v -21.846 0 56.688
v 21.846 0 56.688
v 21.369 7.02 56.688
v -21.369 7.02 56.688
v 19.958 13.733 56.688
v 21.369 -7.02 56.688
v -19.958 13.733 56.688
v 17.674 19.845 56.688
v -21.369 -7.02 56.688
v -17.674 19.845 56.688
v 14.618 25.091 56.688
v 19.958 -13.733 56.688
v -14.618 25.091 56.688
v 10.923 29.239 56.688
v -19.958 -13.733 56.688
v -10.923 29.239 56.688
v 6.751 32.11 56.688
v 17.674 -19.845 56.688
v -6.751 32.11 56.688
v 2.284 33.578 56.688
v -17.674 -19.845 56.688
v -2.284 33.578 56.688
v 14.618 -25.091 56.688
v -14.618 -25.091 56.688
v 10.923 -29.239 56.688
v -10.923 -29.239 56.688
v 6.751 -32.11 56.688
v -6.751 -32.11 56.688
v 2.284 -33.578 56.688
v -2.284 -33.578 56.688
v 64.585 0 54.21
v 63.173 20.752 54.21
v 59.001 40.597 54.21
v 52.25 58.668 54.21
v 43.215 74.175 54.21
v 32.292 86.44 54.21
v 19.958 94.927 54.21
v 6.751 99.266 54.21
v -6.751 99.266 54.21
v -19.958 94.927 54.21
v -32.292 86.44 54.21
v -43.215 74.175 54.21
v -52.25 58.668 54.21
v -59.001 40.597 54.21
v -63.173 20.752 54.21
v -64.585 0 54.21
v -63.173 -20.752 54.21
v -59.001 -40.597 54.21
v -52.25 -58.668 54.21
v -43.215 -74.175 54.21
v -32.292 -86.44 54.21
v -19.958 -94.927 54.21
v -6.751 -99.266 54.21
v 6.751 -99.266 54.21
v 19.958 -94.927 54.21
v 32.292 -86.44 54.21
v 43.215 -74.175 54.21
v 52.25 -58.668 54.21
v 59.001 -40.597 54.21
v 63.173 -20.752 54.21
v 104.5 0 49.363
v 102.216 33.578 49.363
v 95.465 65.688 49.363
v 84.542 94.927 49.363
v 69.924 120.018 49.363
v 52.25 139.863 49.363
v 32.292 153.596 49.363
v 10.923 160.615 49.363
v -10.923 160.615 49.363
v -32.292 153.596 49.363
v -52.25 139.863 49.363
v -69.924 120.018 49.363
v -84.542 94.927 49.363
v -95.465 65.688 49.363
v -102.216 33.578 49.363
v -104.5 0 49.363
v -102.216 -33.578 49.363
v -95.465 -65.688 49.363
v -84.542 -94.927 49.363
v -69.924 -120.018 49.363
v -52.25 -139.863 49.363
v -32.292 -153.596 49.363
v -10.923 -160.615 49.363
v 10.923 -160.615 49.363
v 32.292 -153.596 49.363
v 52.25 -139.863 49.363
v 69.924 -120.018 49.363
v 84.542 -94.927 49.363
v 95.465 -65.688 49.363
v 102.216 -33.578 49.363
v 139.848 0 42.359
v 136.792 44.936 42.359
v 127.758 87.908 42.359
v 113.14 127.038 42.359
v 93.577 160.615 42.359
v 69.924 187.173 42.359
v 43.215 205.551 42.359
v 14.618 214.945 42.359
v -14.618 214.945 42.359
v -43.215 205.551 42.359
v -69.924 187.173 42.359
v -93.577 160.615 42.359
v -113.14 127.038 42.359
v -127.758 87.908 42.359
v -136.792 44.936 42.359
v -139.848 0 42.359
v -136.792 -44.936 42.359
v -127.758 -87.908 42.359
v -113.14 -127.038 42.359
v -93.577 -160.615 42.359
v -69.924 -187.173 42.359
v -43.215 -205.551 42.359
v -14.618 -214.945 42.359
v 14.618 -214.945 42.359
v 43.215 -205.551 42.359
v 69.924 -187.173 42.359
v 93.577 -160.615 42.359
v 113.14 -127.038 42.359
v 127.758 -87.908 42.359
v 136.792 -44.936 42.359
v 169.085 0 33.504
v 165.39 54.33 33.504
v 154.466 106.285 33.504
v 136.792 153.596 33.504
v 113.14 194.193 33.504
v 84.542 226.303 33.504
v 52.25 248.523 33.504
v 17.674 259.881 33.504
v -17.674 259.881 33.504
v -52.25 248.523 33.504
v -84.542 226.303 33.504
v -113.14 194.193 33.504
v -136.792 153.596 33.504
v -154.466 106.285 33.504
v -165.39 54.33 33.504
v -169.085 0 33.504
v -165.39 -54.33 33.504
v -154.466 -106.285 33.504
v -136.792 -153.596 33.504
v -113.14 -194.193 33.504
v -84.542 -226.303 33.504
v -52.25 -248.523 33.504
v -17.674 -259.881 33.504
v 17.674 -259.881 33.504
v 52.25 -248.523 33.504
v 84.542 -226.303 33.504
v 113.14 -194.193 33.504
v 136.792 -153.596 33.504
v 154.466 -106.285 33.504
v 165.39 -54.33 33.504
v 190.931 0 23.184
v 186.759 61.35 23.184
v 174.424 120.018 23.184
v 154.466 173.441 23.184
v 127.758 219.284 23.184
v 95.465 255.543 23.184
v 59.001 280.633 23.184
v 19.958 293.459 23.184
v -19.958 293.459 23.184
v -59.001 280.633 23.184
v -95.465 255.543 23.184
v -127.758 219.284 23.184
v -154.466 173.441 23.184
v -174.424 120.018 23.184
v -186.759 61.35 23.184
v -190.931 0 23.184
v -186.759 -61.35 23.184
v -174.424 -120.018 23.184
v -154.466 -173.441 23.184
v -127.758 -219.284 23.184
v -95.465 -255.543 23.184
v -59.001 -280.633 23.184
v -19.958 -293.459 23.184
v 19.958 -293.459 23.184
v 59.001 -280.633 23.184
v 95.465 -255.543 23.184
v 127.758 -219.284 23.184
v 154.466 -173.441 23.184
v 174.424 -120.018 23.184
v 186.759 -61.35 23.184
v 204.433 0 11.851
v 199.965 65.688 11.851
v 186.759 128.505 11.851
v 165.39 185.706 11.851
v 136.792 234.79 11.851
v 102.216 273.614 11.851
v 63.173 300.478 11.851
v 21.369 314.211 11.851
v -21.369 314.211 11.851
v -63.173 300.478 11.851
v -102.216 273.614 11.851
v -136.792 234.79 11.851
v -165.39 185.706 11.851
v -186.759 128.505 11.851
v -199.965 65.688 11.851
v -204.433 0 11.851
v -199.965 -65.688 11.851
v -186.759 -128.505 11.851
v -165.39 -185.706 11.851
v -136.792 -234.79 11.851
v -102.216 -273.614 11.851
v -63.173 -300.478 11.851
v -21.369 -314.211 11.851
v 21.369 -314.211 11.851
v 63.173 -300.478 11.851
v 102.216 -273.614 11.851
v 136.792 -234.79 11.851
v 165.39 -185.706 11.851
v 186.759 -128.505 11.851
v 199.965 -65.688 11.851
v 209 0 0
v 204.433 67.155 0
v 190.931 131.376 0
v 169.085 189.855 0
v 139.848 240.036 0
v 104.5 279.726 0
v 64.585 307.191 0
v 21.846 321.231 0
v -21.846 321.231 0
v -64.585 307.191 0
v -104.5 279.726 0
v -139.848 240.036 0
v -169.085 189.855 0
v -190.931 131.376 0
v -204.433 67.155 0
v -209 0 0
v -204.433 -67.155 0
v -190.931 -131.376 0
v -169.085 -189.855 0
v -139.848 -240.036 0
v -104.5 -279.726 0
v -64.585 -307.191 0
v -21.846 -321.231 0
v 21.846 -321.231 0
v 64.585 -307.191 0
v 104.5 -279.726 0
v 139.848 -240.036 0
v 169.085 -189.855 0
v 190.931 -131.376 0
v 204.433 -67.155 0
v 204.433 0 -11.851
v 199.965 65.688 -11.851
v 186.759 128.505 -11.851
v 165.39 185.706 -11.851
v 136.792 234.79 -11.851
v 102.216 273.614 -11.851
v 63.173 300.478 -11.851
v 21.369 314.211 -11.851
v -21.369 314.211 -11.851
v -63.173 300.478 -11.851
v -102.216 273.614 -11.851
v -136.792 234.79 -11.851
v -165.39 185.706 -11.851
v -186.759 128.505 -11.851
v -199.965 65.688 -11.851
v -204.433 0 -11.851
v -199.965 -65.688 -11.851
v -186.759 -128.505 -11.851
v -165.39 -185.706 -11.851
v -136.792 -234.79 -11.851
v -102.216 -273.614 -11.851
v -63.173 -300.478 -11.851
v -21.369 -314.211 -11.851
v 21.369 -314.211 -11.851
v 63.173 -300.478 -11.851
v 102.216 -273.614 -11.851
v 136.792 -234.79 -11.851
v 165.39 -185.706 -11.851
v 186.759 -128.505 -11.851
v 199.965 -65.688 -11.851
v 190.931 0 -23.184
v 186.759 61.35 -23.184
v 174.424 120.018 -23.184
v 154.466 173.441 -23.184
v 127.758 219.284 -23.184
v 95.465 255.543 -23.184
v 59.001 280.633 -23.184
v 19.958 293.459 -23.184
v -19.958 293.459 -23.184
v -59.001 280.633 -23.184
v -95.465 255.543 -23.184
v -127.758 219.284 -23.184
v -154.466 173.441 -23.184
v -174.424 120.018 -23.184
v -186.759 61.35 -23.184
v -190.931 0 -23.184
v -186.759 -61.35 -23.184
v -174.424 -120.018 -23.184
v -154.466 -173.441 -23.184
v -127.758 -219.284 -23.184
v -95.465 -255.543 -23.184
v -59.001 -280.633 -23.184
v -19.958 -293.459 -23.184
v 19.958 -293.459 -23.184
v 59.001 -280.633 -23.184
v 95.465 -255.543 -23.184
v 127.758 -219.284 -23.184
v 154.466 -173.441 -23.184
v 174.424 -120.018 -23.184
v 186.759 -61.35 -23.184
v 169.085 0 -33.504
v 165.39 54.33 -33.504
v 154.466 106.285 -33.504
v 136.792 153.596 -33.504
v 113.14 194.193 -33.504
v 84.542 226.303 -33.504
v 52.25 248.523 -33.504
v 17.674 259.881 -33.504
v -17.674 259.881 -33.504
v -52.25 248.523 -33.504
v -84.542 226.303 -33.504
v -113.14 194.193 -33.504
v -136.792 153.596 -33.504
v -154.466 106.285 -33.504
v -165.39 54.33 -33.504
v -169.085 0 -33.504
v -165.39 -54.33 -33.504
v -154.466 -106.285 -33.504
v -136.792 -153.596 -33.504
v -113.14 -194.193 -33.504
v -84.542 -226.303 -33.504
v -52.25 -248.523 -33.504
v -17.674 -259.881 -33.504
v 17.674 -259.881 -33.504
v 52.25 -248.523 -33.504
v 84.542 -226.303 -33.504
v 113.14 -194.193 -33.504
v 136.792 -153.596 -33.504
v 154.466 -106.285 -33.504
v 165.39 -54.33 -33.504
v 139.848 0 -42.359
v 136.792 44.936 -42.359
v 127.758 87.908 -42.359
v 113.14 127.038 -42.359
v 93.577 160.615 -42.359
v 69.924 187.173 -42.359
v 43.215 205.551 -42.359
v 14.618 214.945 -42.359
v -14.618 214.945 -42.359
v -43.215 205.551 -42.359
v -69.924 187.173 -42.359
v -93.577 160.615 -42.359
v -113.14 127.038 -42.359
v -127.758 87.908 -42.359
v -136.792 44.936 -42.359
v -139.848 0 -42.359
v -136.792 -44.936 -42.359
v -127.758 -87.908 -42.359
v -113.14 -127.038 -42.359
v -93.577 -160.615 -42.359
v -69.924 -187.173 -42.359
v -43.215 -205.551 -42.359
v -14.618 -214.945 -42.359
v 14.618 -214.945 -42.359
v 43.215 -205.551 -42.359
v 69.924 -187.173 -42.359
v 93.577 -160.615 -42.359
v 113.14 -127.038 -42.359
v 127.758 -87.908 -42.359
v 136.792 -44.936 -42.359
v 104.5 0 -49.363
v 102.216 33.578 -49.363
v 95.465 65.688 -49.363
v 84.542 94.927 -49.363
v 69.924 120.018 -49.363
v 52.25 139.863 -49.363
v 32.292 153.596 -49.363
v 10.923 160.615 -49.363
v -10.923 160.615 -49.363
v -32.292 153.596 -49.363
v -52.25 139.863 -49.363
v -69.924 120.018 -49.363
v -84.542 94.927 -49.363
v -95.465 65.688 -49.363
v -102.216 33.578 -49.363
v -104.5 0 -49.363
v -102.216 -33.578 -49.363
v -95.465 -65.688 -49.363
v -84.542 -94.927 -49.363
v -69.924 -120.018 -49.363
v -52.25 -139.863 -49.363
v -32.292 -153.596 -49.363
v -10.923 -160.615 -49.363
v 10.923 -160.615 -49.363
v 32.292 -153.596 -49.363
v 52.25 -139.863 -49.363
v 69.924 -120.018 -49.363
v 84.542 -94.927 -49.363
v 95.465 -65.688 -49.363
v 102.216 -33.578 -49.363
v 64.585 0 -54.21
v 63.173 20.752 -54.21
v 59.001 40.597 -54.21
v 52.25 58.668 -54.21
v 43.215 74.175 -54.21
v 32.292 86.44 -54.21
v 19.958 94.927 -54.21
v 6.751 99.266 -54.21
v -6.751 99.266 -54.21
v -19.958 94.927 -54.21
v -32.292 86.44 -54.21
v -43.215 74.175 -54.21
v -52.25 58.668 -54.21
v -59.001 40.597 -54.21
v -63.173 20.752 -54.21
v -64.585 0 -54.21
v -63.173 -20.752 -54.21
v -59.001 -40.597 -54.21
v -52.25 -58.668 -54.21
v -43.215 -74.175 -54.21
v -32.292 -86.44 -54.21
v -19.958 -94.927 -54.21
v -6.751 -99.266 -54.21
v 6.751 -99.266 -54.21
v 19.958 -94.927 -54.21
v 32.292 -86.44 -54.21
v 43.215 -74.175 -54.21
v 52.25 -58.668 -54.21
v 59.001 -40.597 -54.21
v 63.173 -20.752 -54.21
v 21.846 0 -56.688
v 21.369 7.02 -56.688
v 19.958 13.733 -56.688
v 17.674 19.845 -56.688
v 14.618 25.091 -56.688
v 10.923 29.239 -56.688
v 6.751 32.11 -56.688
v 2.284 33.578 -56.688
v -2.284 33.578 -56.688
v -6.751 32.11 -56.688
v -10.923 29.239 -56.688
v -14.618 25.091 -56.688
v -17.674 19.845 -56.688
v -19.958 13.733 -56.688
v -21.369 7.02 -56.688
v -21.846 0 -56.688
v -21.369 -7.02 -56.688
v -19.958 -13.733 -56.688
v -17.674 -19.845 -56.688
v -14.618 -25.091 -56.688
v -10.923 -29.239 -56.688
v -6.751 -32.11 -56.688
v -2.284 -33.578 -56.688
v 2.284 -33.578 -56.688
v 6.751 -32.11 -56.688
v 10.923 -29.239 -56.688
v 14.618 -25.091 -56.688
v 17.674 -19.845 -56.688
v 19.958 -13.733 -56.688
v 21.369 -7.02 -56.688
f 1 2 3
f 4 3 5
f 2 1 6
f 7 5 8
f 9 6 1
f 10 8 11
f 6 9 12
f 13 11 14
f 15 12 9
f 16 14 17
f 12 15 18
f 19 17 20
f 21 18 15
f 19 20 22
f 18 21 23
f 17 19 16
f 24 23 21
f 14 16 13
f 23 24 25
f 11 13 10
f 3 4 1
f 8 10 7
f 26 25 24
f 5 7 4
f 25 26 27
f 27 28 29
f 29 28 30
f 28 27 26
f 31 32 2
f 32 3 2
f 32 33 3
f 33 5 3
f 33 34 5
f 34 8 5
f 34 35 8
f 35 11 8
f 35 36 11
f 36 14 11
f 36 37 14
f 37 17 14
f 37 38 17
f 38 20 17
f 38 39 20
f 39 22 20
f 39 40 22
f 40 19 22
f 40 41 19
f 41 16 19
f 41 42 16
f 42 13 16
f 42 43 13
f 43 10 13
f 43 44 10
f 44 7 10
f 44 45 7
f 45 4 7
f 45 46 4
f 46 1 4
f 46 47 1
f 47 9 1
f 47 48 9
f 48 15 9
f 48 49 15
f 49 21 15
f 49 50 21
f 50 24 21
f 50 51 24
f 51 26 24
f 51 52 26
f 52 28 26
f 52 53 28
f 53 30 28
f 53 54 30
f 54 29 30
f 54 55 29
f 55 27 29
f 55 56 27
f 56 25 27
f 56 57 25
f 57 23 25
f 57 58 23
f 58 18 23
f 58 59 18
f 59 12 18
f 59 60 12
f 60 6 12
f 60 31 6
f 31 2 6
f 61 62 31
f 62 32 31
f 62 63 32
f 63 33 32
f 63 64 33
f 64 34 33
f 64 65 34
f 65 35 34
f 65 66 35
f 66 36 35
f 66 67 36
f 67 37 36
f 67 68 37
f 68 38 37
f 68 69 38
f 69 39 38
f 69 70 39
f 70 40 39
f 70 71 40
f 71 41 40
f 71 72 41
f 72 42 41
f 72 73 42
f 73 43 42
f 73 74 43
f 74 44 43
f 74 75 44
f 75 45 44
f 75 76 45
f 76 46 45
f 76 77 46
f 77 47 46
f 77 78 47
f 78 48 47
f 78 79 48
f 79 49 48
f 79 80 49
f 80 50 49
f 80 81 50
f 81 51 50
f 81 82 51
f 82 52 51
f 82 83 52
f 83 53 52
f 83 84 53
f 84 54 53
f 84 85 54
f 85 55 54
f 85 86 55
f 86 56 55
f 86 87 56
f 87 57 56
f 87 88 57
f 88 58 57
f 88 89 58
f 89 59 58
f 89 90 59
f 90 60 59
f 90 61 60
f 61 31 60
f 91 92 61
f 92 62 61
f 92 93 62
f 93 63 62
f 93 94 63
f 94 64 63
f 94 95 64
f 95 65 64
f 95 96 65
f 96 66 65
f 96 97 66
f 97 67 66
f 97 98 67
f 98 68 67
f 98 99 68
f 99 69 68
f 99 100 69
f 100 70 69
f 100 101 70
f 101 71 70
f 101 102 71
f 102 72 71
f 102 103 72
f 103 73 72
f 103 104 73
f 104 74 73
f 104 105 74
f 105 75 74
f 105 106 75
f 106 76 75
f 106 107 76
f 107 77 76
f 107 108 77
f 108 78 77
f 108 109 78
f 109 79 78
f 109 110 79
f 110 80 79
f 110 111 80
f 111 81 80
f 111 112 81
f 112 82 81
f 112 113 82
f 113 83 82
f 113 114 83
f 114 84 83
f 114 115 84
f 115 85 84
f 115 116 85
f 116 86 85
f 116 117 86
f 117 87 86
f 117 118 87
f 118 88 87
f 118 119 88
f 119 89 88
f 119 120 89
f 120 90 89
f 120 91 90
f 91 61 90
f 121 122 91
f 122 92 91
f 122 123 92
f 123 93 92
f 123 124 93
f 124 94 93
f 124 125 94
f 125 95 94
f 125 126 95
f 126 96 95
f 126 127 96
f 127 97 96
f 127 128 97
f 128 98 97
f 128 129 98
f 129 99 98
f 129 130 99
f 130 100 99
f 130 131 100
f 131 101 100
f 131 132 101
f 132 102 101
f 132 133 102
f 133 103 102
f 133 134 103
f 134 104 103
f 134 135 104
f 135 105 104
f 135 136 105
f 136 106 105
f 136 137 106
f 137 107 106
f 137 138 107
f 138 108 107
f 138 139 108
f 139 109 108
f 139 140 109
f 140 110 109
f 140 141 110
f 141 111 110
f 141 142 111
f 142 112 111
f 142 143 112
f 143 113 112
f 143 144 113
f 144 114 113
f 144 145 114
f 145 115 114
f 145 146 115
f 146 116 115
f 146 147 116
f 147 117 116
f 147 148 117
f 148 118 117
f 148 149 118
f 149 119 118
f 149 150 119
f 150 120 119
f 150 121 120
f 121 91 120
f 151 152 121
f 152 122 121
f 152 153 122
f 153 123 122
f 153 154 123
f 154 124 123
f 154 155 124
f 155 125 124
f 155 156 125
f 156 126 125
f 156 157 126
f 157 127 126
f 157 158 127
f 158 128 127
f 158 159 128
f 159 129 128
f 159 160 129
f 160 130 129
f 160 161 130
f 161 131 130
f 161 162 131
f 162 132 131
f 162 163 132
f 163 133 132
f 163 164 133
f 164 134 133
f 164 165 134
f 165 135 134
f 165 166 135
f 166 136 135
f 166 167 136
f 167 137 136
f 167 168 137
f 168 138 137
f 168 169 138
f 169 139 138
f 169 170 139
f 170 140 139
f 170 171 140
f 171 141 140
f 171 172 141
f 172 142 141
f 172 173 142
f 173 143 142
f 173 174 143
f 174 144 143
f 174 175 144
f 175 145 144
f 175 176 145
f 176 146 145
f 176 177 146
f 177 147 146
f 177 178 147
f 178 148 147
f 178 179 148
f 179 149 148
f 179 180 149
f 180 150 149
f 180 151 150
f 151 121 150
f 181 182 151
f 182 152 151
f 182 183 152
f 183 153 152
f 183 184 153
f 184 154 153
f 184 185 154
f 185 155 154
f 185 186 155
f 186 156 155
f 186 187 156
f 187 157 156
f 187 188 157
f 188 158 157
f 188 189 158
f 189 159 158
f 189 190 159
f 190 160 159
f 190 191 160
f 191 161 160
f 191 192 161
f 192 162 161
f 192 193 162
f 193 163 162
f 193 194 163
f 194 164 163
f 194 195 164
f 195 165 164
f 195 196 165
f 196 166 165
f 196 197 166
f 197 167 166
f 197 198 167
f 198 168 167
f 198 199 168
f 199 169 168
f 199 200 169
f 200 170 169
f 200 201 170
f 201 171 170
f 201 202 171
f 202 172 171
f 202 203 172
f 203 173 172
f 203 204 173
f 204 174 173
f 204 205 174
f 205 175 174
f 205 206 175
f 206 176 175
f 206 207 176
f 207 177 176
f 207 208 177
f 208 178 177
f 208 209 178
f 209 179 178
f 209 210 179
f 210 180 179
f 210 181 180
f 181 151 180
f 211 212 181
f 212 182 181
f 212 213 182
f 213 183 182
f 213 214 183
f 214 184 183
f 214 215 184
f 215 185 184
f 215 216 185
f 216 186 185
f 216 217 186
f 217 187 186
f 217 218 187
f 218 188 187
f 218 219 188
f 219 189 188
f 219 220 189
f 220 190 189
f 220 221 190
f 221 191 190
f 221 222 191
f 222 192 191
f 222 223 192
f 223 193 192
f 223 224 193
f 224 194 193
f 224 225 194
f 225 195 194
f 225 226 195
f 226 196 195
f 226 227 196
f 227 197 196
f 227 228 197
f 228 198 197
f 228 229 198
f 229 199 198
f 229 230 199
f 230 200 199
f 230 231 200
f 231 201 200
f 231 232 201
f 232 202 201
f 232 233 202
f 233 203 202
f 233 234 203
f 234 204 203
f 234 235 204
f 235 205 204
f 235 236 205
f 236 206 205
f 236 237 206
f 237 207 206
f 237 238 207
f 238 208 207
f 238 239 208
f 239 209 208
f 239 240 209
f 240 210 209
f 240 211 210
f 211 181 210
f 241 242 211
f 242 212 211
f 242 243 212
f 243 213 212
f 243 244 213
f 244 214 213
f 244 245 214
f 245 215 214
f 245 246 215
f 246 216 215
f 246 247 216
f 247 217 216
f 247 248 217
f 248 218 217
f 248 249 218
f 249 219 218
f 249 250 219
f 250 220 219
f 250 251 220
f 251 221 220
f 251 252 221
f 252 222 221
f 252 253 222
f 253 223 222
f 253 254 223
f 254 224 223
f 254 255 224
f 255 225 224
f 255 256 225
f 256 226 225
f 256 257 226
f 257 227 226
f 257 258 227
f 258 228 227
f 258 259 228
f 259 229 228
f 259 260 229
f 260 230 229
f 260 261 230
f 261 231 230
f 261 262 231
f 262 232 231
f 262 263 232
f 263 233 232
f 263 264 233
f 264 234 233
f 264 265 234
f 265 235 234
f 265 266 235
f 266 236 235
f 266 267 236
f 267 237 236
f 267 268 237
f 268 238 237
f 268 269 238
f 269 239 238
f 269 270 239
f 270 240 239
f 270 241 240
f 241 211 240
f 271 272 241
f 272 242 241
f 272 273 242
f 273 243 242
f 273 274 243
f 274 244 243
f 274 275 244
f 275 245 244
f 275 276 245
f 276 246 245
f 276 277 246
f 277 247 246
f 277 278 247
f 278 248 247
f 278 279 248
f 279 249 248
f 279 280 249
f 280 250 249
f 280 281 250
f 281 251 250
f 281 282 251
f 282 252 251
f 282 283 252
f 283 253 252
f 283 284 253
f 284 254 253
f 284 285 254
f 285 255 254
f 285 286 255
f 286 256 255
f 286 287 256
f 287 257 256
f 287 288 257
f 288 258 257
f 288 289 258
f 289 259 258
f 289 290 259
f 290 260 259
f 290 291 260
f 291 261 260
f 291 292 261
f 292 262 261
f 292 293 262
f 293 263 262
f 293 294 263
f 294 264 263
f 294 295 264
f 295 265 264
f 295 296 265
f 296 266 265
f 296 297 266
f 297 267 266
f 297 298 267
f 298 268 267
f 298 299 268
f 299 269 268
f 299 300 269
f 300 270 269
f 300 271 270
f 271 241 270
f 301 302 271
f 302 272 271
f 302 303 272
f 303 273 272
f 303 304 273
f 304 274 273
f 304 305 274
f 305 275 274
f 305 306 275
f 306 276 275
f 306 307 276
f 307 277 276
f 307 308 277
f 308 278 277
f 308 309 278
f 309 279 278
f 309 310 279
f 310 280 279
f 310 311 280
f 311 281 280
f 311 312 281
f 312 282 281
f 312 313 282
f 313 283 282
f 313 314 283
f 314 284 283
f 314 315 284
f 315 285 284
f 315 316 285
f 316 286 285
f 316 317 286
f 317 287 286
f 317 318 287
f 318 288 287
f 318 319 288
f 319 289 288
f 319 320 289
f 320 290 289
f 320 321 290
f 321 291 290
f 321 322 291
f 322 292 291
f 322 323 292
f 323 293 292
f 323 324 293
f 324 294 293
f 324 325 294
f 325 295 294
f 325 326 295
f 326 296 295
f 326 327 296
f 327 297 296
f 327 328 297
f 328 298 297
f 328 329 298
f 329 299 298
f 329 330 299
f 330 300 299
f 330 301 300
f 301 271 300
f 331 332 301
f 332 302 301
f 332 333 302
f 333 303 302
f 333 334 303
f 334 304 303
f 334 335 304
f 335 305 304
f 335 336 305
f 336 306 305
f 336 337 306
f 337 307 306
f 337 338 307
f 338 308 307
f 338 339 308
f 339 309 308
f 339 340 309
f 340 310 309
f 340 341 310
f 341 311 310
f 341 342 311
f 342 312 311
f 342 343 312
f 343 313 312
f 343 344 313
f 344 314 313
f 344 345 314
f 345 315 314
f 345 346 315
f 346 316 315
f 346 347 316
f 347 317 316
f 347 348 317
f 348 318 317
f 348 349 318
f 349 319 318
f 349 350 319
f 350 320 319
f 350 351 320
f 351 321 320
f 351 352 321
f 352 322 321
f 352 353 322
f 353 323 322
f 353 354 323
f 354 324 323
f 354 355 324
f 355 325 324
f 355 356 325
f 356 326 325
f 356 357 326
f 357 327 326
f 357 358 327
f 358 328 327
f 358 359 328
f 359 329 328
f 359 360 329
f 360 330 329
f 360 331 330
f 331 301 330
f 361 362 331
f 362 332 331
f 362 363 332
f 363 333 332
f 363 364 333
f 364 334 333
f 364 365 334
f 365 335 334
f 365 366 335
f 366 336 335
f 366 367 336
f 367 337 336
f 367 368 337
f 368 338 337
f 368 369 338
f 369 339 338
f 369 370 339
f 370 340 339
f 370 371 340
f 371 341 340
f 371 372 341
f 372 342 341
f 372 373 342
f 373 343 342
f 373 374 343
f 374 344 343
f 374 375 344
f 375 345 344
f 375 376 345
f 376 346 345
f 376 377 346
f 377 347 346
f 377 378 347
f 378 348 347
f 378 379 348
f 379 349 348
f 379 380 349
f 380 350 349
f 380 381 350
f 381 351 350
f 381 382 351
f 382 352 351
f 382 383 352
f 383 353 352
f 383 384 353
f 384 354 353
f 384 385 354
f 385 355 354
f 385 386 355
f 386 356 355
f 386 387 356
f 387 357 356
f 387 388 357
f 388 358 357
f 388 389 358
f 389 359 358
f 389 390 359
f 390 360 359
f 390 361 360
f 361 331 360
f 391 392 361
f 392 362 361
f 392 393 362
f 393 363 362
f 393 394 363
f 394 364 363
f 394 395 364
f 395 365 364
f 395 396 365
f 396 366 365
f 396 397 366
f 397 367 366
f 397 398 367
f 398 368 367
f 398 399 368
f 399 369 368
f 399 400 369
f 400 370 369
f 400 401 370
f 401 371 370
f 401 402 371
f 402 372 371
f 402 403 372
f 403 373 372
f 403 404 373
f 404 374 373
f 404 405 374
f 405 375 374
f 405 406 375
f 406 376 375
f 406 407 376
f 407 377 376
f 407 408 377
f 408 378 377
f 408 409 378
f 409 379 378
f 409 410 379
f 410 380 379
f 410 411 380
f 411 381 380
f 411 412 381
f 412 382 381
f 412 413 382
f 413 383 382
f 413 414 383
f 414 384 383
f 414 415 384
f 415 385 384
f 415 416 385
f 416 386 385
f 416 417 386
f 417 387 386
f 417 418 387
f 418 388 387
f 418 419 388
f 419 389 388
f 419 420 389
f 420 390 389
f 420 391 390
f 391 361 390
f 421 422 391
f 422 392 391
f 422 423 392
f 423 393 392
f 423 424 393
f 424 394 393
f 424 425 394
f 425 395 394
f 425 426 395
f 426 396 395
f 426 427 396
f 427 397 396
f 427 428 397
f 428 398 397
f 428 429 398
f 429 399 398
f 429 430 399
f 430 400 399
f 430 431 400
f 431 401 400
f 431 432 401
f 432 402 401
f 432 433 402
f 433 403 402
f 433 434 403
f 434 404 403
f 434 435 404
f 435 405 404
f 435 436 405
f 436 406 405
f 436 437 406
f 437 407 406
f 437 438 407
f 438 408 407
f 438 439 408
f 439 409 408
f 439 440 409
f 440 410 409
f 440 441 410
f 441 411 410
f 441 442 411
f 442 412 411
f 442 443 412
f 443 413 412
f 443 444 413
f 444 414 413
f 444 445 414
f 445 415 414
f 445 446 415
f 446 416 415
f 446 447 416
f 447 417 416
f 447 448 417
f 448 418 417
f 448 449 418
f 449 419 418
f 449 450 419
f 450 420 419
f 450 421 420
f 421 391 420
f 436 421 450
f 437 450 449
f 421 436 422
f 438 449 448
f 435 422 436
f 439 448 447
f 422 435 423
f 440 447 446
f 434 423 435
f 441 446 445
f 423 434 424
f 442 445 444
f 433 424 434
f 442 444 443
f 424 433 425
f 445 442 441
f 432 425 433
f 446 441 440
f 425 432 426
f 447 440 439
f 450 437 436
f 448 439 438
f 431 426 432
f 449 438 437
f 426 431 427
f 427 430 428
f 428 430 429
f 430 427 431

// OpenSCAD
// Generated by SolidPython 1.0.1 on 2020-07-29 00:46:50


scale(v = [11, 17, 3]) {
	sphere(r = 19);
}
/***********************************************
*********      SolidPython code:      **********
************************************************
 
# import packages: SolidPython
from solid import *
from solid.utils import *
from itertools import chain, combinations, permutations


class Resize:

    def __init__(self, scad_file):
        self.scad_file = scad_file
        #self.scad_file = import_scad(scad_file)
        # cone/cylinder param:
        self.r1 = 0
        self.r2 = 0
        self.h = 0
        # rectangular prism param:
        self.w = 0
        self.l = 0
        # ellipse param:
        self.r = 0

    # import OpenScad code (file name corresponds to shape)


    # classify shape + parameters
    def assign(self, param1, param2, param3):
        if self.scad_file == 'cone.scad':
            self.r1 = param1
            self.r2 = param2
            self.h = param3
        elif self.scad_file == 'cylinder.scad':
            self.r1 = param1
            self.r2 = param2
            self.h = param3
        elif self.scad_file == 'rectangularPrism.scad':
            self.h = param1
            self.l = param2
            self.w = param3
        else:
            self.r = param1
            self.h = param2

    # resize parameters
    def iterate(self):
        x = range(3, 20, 2)
        i = 1
        if self.scad_file == 'cone.scad':
            tempList = list(permutations(x, 2))
            for temp in tempList:
                param1 = temp[0]
                param2 = temp[1]
                filepath = 'produced_scad_files/' + 'cone' + str(param1) + '_' + str(param2) + '_' + '.scad'
                scad_render_to_file(cylinder(h=param1, r1=param2, r2=0), filepath)

        elif self.scad_file == 'cylinder.scad':
            tempList = list(permutations(x, 3))
            for temp in tempList:
                param1 = temp[0]
                param2 = temp[1]
                filepath = 'produced_scad_files/' + 'cylinder' + str(param1) + '_' + str(param2) + '_' + '.scad'
                scad_render_to_file(cylinder(h=param1, r1=param2, r2=param2), filepath)

        elif self.scad_file == 'rectangularPrism.scad':
            tempList = list(permutations(x, 3))
            for temp in tempList:
                param1 = temp[0]
                param2 = temp[1]
                param3 = temp[2]
                filepath = 'produced_scad_files/' + 'rectangularPrism' + str(param1) + '_' + str(param2) + '_' + str(
                    param3) + '.scad'
                scad_render_to_file(cube(size=(param1, param2, param3)), filepath)

        elif self.scad_file == 'ellipse.scad':
            tempList = list(permutations(x, 4))
            for temp in tempList:
                param1 = temp[0]
                param2 = temp[1]
                param3 = temp[2]
                param4 = temp[3]
                filepath = 'produced_scad_files/' + 'ellipse' + str(param1) + '_' + str(param2) + '_' + str(param3) + '_' + str(param4) + '.scad'
                scad_render_to_file(scale([param1, param2, param3])(sphere(r=param4)), filepath)

    def render_to_scadfile(self):
        scad_render_to_file(scad, 'example.scad') 
 
************************************************/
